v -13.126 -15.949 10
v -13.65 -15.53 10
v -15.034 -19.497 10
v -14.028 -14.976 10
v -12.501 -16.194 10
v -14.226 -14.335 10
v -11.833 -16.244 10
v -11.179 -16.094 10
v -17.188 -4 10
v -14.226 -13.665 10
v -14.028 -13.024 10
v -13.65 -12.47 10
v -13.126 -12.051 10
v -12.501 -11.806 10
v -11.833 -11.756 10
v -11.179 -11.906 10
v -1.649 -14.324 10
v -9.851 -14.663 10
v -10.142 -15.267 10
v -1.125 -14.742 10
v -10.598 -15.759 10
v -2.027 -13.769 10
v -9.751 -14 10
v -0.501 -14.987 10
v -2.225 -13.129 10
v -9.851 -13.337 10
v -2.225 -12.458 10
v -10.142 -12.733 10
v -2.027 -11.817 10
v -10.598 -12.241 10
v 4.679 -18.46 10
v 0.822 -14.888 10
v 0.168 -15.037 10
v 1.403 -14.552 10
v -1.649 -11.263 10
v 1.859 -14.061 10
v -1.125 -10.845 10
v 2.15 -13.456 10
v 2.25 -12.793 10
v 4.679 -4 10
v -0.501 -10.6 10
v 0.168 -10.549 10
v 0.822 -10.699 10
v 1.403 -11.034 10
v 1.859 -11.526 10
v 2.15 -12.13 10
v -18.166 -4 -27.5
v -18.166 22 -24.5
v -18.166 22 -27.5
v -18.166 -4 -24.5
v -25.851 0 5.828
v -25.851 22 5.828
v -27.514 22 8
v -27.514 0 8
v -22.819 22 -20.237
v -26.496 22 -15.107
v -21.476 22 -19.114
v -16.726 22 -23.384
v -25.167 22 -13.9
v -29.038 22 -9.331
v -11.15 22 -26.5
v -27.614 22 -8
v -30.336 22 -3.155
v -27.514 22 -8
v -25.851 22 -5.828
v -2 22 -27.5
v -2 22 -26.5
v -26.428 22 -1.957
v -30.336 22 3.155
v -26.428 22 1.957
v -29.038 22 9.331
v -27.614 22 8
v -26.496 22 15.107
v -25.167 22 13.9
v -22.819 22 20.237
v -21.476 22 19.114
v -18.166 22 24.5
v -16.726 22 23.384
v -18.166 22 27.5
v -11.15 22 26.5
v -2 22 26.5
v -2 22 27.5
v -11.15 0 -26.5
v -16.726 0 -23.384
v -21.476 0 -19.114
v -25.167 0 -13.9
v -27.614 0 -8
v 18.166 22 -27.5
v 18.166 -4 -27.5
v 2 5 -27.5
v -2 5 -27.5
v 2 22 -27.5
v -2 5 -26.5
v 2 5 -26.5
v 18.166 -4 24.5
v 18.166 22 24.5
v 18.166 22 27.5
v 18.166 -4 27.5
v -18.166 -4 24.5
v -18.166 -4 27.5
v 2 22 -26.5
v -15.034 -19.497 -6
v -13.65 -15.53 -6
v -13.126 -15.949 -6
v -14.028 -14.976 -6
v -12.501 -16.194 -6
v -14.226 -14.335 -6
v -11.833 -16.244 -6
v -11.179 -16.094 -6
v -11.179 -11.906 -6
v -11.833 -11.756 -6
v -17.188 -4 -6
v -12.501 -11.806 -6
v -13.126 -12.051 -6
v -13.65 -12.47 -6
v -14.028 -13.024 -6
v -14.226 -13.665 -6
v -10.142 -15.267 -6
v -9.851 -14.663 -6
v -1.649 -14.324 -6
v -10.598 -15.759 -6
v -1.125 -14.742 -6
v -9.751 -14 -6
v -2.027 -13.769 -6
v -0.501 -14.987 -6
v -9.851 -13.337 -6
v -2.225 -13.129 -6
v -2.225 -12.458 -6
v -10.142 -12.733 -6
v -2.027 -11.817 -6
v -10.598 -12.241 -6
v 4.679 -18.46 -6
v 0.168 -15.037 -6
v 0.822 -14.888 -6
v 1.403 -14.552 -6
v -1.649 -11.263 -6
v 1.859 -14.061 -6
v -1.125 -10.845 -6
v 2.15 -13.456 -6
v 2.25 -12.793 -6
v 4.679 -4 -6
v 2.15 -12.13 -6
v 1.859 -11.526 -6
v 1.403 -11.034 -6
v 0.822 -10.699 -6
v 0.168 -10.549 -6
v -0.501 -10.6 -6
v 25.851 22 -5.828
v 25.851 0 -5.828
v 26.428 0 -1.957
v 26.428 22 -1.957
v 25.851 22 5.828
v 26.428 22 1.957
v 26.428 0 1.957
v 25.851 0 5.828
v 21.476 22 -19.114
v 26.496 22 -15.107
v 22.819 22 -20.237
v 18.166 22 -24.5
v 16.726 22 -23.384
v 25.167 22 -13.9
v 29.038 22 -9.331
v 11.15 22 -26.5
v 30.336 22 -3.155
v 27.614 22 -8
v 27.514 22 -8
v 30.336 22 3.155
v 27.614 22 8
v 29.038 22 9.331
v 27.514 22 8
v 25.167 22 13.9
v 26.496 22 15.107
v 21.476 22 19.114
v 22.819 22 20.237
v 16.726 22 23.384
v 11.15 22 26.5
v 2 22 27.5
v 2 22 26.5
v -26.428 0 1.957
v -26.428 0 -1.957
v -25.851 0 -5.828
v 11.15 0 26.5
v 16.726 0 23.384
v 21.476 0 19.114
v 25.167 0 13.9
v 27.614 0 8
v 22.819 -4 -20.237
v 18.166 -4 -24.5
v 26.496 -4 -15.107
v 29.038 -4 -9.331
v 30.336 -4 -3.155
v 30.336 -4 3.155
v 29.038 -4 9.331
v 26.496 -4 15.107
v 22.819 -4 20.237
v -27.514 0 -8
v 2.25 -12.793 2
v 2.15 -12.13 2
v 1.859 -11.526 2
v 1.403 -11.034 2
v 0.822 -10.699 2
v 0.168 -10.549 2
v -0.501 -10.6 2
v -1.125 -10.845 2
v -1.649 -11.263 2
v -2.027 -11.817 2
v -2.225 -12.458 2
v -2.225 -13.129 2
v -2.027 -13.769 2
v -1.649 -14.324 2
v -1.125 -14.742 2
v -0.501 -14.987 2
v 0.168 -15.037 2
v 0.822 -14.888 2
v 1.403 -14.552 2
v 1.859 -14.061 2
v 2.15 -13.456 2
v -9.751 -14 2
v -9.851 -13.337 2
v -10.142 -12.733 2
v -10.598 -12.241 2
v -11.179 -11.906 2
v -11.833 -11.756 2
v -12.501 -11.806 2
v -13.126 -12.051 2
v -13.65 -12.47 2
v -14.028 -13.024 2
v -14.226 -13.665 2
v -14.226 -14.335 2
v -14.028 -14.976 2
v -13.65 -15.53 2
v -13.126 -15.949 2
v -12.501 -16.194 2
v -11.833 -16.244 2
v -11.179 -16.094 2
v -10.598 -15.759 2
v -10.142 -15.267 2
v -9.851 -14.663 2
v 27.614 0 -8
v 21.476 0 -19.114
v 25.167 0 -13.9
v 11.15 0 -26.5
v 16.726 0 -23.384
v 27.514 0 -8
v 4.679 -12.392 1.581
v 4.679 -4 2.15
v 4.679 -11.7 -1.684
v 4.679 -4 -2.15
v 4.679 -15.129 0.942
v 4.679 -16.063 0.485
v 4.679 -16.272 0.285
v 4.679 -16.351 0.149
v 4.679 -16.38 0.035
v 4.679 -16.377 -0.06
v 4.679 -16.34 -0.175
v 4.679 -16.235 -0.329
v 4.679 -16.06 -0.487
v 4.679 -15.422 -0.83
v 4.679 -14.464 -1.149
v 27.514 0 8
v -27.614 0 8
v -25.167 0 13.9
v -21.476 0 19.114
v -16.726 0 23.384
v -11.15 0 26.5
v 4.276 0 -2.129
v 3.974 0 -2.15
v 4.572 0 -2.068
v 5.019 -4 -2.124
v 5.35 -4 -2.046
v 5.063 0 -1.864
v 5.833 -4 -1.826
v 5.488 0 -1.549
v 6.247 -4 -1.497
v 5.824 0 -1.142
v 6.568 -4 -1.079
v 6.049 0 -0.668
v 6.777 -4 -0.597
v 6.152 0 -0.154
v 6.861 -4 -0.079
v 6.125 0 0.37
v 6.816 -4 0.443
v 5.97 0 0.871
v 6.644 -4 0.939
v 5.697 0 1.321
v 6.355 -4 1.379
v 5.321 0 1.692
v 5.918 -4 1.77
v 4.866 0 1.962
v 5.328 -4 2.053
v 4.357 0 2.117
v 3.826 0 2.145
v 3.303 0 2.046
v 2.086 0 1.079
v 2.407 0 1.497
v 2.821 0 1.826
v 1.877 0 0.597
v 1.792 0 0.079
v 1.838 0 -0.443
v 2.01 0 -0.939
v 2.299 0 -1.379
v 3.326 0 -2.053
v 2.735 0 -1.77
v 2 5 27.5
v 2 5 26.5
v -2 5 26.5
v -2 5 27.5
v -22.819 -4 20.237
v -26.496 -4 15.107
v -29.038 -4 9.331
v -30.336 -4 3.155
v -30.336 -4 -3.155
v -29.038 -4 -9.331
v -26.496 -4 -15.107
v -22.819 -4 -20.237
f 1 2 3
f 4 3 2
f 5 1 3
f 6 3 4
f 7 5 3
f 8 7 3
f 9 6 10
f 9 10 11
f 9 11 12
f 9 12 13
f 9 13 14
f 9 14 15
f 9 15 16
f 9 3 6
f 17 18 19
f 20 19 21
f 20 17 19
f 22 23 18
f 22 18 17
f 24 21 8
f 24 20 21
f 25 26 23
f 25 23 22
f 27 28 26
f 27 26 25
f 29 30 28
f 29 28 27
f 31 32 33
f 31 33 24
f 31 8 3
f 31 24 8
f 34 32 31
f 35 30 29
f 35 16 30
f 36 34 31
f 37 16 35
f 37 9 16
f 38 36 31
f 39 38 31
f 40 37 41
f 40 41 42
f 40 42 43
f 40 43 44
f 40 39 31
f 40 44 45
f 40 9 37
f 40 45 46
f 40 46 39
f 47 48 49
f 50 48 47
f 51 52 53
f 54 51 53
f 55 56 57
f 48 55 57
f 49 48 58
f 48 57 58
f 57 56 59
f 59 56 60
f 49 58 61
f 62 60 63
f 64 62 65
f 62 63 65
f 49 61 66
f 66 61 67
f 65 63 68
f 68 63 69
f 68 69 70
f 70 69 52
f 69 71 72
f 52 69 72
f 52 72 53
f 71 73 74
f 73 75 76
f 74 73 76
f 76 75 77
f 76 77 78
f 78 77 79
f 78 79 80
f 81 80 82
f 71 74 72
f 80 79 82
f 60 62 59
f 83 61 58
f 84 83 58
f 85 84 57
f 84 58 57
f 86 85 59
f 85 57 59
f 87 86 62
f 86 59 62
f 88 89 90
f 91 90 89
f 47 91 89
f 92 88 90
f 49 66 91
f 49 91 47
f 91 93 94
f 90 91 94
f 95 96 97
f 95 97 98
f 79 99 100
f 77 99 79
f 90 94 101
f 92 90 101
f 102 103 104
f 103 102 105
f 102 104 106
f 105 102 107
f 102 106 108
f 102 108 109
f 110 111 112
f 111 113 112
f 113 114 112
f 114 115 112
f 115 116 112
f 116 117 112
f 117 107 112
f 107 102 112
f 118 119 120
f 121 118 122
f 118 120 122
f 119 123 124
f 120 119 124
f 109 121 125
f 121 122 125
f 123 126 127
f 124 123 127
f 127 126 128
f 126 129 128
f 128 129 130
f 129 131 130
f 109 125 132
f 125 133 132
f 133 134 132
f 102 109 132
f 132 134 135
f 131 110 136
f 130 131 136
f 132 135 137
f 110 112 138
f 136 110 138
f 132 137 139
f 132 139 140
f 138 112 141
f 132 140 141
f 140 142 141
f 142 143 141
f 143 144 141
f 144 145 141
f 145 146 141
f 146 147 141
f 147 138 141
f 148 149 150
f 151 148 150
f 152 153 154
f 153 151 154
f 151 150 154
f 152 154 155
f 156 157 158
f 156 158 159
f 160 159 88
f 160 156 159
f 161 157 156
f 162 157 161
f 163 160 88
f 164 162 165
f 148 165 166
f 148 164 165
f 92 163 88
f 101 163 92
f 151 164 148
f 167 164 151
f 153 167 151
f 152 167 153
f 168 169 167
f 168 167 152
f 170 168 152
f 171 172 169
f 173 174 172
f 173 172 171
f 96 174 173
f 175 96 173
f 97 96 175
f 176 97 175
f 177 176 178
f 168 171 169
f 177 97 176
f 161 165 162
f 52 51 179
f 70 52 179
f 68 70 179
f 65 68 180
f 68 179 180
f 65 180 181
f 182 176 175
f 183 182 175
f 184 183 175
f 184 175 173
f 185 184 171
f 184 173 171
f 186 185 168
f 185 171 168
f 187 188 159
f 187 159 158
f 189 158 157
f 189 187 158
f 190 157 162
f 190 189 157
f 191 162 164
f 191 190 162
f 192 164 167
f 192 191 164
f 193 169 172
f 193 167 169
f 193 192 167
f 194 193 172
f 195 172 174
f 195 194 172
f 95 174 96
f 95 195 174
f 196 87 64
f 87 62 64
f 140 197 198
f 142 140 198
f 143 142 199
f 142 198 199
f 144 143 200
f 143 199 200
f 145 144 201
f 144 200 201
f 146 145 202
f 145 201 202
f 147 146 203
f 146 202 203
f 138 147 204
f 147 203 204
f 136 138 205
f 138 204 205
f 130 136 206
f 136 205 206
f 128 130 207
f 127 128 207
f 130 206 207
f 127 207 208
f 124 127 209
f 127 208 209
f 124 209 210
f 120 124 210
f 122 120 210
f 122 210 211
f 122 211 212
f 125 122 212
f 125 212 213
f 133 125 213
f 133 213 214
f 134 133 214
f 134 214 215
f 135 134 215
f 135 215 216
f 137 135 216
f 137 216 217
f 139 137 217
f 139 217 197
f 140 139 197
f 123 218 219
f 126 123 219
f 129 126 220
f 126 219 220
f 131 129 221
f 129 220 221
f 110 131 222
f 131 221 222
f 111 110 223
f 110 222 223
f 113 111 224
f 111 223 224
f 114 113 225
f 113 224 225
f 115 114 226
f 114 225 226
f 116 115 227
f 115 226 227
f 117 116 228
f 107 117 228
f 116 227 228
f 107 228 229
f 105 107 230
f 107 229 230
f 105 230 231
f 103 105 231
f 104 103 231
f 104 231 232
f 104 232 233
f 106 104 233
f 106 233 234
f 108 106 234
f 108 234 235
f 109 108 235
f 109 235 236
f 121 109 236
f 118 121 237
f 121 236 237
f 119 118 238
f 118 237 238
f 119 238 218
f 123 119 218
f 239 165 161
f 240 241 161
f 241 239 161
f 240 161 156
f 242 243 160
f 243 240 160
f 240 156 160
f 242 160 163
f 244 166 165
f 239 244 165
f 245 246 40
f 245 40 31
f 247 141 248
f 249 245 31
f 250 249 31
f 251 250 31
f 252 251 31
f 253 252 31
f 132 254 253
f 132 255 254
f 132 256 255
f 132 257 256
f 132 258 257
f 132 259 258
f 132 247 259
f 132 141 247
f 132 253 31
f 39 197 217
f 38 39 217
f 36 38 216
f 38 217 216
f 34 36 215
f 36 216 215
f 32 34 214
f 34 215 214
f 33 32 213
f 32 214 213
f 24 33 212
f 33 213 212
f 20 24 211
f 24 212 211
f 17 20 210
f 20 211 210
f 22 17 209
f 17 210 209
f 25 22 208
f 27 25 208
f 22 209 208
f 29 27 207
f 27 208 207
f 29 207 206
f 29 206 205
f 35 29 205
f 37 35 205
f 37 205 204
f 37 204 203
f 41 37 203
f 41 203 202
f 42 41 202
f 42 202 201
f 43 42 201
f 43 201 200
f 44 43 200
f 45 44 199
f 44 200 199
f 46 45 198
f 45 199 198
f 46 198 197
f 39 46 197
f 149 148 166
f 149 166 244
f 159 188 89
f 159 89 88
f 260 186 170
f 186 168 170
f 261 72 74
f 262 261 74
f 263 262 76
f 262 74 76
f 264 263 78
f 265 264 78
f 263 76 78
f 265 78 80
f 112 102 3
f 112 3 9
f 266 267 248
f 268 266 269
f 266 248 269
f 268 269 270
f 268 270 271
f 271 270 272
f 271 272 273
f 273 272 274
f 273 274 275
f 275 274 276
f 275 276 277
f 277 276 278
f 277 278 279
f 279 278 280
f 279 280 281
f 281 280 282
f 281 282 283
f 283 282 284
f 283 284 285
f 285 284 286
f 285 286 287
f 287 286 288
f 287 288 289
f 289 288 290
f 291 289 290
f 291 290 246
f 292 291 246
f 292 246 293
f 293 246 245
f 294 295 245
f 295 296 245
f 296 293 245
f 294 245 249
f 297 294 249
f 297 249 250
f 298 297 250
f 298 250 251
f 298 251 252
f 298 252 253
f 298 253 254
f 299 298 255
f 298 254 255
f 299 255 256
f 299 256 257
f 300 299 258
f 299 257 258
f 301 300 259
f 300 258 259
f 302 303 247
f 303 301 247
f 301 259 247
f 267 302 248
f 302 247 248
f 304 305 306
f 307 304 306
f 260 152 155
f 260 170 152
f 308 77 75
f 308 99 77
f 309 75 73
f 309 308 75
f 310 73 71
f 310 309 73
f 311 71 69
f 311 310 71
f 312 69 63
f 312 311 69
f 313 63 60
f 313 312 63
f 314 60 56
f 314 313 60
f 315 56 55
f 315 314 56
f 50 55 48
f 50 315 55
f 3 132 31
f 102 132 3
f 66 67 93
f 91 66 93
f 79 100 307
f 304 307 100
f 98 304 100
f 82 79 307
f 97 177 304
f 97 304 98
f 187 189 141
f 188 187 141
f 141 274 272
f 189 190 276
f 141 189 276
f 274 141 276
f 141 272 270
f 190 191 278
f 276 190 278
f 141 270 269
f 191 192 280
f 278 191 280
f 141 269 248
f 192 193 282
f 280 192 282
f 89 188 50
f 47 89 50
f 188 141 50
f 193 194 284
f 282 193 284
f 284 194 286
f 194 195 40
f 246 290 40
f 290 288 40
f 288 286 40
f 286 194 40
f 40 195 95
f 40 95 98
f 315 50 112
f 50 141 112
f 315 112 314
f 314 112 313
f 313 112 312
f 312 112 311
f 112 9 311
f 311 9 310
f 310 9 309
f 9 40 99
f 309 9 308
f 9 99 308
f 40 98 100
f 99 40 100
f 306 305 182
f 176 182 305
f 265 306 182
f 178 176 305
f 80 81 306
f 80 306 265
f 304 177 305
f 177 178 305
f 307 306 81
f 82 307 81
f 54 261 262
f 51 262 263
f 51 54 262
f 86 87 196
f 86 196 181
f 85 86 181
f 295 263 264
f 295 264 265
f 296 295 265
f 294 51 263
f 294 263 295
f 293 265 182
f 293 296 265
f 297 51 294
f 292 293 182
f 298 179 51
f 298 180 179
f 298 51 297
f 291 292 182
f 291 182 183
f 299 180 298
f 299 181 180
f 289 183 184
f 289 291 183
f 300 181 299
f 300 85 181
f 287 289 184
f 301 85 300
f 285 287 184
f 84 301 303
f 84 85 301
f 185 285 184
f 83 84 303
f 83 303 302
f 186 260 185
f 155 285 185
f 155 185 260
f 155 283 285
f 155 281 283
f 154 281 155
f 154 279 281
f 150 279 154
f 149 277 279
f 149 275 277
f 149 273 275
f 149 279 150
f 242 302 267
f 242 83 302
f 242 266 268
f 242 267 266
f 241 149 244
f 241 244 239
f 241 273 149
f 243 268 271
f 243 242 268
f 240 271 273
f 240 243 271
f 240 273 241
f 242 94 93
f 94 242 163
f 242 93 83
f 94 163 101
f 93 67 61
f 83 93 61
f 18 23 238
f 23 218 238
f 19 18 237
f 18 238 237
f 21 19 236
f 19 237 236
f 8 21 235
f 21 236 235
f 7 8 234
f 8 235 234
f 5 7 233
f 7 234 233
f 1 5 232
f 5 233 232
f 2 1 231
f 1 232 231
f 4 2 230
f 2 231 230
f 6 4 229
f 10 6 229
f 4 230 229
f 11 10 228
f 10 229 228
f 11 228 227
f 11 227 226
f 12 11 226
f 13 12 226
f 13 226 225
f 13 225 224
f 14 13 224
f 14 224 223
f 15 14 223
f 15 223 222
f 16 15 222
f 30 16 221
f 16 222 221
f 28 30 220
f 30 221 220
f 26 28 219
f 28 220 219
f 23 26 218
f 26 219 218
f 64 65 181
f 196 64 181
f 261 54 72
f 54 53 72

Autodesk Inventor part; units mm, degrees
sketch "Sketch1" plane through (0, 0, 0) normal (0, 1, 0) x (-1, 0, 0)
  circle A0 centre (0, 0) radius 26.5
  circle A1 centre (0, 0) radius 30.5
  dimension "d0" = 53
  dimension "d1" = 4
extrude "Extrusion1" add sketch "Sketch1" along normal blind 22
extrude "Extrusion2" add sketch "Sketch1" against normal blind 4 contours A0 | A1
ref_plane "Work Plane1" through (0, 15, 0) normal (0, 1, 0) x (1, 0, 0)
ref_plane "Work Plane2" through (30.5, 0, 0) normal (1, 0, 0) x (0, 1, 0)
sketch "Sketch3" plane through (30.5, 0, 0) normal (1, 0, 0) x (0, 1, 0)
  line L0 (14, -18.4883) -> (14, 18.4883) projected
  line L1 (16, 18.4883) -> (16, -18.4883) projected
  line L2 (16, 21.067) -> (16, 18.4883) projected
  line L3 (14, 18.4883) -> (14, 21.067) projected
  line L4 (16, 21.067) -> (16, -21.067) projected
  line L5 (16, 21.067) -> (16, 18.4883) projected
  line L6 (16, 18.4883) -> (16, -18.4883) projected
  line L7 (16, -18.4883) -> (16, -21.067) projected
  line L8 (14, -21.067) -> (14, -18.4883) projected
  line L9 (23, 32.2933) -> (-6, 32.2933)
  line L10 (-6, 32.2933) -> (-6, -38.454)
  line L11 (-6, -38.454) -> (23, -38.454)
  line L12 (23, -38.454) -> (23, 32.2933)
  line L13 (23, 24.5) -> (-6, 24.5)
  line L14 (23, -24.5) -> (-6.5731, -24.5)
  line L15 (-4, 30.5) -> (22, 30.5) projected
  line L16 (-4, -30.5) -> (22, -30.5) projected
  point P0 (0, 0)
  point P1 (-6, -24.5)
  dimension "d11" = 7
  dimension "d12" = 20
  dimension "d31" = 6
  dimension "d32" = 6
extrude "Extrusion4" cut sketch "Sketch3" against normal through all contours L12 L13 L10 L9 | L12 L11 L10 L14
sketch "Sketch4" plane through (0, 15, 0) normal (0, 1, 0) x (1, 0, 0)
  point P0 (0, 0)
ref_plane "Work Plane6" through (0, 0, 2) normal (0, 0, 1) x (1, 0, 0)
ref_plane "Work Plane5" through (0, 0, 30.5) normal (0, 0, 1) x (1, 0, 0)
sketch "Sketch6" plane through (0, 0, 2) normal (0, 0, 1) x (1, 0, 0)
  point P0 (0, 0)
sketch "Sketch7" plane through (0, 0, 2) normal (0, 0, 1) x (1, 0, 0)
  line L0 (-30.5, -4) -> (30.5, -4) projected
  line L1 (0, -4) -> (0, -71)
  circle A0 centre (0, -71) radius 57
  circle A1 centre (0, -71) radius 59.5
  circle A2 centre (0, -12.7932) radius 2.25
  circle A3 centre (-12.0008, -14) radius 2.25
  line L2 (4.6794, -4) -> (4.6794, -18.4597)
  line L3 (4.6794, -18.4597) -> (-15.0336, -19.4972)
  line L4 (-15.0336, -19.4972) -> (-17.1884, -4)
  point P0 (0, 0)
  dimension "d24" = 67
  dimension "d25" = 114
  dimension "d26" = 119
  dimension "d27" = 4.5
  dimension "d28" = 4.5
extrude "Extrusion6" add sketch "Sketch7" along normal mid plane 16 contours L0 L1 A2 A1 A3 L4 | L0 L2 A1 A2 L1 | A1 A3 A0 L4 | A0 A3 A2 L1 L3 L4 | L2 A0 A2 A1 | A2 A0 A3 A1 | L2 L3 L1 A2 A0
sketch "Sketch8" plane through (-18.1659, -4, 24.5) normal (0, 0, 1) x (1, 0, 0)
  line L0 (28.2654, 26) -> (36.3318, 26) projected
  line L1 (36.3318, 0) -> (0, 0) projected
  line L2 (36.3318, 26) -> (28.2654, 26)
  line L3 (28.2654, 26) -> (28.2654, 0)
  line L4 (28.2654, 0) -> (36.3318, 0)
  line L5 (36.3318, 0) -> (36.3318, 26)
  line L6 (28.2654, 4) -> (28.2654, 26) projected
  line L7 (0, 0) -> (0, 26) projected
  line L8 (36.3318, 0) -> (0, 0)
  line L9 (0, 0) -> (0, 4)
  line L10 (0, 4) -> (36.3318, 4)
  line L11 (36.3318, 4) -> (36.3318, 0)
  line L12 (8.0664, 26) -> (8.0664, 4) projected
  line L13 (0, 0) -> (8.0664, 0)
  line L14 (8.0664, 0) -> (8.0664, 26)
  line L15 (8.0664, 26) -> (0, 26)
  line L16 (0, 26) -> (0, 0)
  point P0 (18.1659, 4)
  dimension "d33" = 0
extrude "Extrusion7" add sketch "Sketch8" along normal blind 2
sketch "Sketch9" plane through (-18.1659, -4, 26.5) normal (0, 0, 1) x (1, 0, 0)
  line L0 (0, 0) -> (36.3318, 0) projected
  line L1 (8.0664, 26) -> (0, 26) projected
  line L2 (36.3318, 0) -> (0, 0)
  line L3 (0, 0) -> (0, 26)
  line L4 (0, 26) -> (36.3318, 26)
  line L5 (36.3318, 26) -> (36.3318, 0)
  line L6 (20.1659, 9) -> (16.1659, 9)
  line L7 (16.1659, 9) -> (16.1659, 26)
  line L8 (16.1659, 26) -> (20.1659, 26)
  line L9 (20.1659, 26) -> (20.1659, 9)
  line L10 (28.2654, 4) -> (8.0664, 4) projected
  point P0 (18.1659, 4)
  point P1 (18.1659, 4)
  point P2 (18.1659, 9)
  point P3 (18.1659, 4)
  dimension "d36" = 4
  dimension "d37" = 0
  dimension "d38" = 5
  dimension "d39" = 0
extrude "Extrusion8" add sketch "Sketch9" along normal blind 1 contours L3 L1 L4 L7 L6 L9 L5 L0
mirror "Mirror1" about plane through (0, 0, 0) normal (0, 0, 1) of "Extrusion8", "Extrusion7"
sketch "Sketch10" plane through (0, 22, 0) normal (0, 1, 0) x (1, 0, 0)
  circle A0 centre (0, 0) radius 28.75
  line L0 (10.0995, -24.5) -> (10.0995, -26.5) projected
  line L1 (10.0995, -26.5) -> (11.74, -26.5)
  line L2 (10.0995, -26.5) -> (11.74, -26.5) construction
  line L3 (11.74, -26.5) -> (-11.1496, -26.5)
  line L4 (27.6145, -8) -> (-27.6145, -8)
  point P0 (0, -8)
  point P1 (11.1496, -26.5)
  dimension "d42" = 57.5
  dimension "d43" = 0
  dimension "d44" = 8
extrude "Extrusion9" cut sketch "Sketch10" against normal up to surface (22 mm away) contours L4 A0 L1 L3
chamfer "Chamfer1" distance 2.25 angle 45 2 edges at (-25.2636, 11, 8) (25.2636, 11, 8)
mirror "Mirror2" about plane through (0, 0, 0) normal (0, 0, 1) of "Extrusion9"
chamfer "Chamfer2" distance 2.25 angle 45 2 edges at (-25.2636, 11, -8) (25.2636, 11, -8)
ref_plane "Work Plane7" through (4.6794, -4, 1) normal (0.1736, -0.9848, 0) x (0, 0, -1)
sketch "Sketch11" plane through (4.6794, -4, 1) normal (0.1736, -0.9848, 0) x (0, 0, -1)
  line L0 (-26.5, -22.4982) -> (-26.5, 13.2817) projected
  line L1 (28.5, -22.4982) -> (28.5, 13.2817) projected
  line L2 (7, -2.5109) -> (-9, -2.5109) projected
  line L3 (-9, 0) -> (7, 0) projected
  circle A0 centre (1, 0) radius 2.15
  point P0 (1, -3.9137)
  dimension "d54" = 4.3
  dimension "d55" = 27.5
extrude "Extrusion10" cut sketch "Sketch11" along normal through all both and the other way through all
ref_plane "Work Plane3" through (30.5, 0, 0) normal (1, 0, 0) x (0, 1, 0)
sketch "Sketch5" plane through (2, 0, 0) normal (1, 0, 0) x (0, 1, 0)
  line L0 (-4, 30.5) -> (-4, -30.5) projected
  line L1 (-4, 0) -> (-71, 0)
  circle A0 centre (-71, 0) radius 57
  circle A1 centre (-71, 0) radius 59.5
  circle A2 centre (-12.675, 0) radius 1.5
  circle A3 centre (-14.6323, 14.7617) radius 1.5
  line L2 (-4, -4.4838) -> (-16.1323, -4.4838)
  line L3 (-16.1323, -4.4838) -> (-19.3598, 18.592)
  line L4 (-19.3598, 18.592) -> (-4, 18.9349)
  point P0 (0, 0)
  dimension "d16" = 67
  dimension "d17" = 114
  dimension "d18" = 119
  dimension "d19" = 3
  dimension "d20" = 3
properties part number "BigLif2"
